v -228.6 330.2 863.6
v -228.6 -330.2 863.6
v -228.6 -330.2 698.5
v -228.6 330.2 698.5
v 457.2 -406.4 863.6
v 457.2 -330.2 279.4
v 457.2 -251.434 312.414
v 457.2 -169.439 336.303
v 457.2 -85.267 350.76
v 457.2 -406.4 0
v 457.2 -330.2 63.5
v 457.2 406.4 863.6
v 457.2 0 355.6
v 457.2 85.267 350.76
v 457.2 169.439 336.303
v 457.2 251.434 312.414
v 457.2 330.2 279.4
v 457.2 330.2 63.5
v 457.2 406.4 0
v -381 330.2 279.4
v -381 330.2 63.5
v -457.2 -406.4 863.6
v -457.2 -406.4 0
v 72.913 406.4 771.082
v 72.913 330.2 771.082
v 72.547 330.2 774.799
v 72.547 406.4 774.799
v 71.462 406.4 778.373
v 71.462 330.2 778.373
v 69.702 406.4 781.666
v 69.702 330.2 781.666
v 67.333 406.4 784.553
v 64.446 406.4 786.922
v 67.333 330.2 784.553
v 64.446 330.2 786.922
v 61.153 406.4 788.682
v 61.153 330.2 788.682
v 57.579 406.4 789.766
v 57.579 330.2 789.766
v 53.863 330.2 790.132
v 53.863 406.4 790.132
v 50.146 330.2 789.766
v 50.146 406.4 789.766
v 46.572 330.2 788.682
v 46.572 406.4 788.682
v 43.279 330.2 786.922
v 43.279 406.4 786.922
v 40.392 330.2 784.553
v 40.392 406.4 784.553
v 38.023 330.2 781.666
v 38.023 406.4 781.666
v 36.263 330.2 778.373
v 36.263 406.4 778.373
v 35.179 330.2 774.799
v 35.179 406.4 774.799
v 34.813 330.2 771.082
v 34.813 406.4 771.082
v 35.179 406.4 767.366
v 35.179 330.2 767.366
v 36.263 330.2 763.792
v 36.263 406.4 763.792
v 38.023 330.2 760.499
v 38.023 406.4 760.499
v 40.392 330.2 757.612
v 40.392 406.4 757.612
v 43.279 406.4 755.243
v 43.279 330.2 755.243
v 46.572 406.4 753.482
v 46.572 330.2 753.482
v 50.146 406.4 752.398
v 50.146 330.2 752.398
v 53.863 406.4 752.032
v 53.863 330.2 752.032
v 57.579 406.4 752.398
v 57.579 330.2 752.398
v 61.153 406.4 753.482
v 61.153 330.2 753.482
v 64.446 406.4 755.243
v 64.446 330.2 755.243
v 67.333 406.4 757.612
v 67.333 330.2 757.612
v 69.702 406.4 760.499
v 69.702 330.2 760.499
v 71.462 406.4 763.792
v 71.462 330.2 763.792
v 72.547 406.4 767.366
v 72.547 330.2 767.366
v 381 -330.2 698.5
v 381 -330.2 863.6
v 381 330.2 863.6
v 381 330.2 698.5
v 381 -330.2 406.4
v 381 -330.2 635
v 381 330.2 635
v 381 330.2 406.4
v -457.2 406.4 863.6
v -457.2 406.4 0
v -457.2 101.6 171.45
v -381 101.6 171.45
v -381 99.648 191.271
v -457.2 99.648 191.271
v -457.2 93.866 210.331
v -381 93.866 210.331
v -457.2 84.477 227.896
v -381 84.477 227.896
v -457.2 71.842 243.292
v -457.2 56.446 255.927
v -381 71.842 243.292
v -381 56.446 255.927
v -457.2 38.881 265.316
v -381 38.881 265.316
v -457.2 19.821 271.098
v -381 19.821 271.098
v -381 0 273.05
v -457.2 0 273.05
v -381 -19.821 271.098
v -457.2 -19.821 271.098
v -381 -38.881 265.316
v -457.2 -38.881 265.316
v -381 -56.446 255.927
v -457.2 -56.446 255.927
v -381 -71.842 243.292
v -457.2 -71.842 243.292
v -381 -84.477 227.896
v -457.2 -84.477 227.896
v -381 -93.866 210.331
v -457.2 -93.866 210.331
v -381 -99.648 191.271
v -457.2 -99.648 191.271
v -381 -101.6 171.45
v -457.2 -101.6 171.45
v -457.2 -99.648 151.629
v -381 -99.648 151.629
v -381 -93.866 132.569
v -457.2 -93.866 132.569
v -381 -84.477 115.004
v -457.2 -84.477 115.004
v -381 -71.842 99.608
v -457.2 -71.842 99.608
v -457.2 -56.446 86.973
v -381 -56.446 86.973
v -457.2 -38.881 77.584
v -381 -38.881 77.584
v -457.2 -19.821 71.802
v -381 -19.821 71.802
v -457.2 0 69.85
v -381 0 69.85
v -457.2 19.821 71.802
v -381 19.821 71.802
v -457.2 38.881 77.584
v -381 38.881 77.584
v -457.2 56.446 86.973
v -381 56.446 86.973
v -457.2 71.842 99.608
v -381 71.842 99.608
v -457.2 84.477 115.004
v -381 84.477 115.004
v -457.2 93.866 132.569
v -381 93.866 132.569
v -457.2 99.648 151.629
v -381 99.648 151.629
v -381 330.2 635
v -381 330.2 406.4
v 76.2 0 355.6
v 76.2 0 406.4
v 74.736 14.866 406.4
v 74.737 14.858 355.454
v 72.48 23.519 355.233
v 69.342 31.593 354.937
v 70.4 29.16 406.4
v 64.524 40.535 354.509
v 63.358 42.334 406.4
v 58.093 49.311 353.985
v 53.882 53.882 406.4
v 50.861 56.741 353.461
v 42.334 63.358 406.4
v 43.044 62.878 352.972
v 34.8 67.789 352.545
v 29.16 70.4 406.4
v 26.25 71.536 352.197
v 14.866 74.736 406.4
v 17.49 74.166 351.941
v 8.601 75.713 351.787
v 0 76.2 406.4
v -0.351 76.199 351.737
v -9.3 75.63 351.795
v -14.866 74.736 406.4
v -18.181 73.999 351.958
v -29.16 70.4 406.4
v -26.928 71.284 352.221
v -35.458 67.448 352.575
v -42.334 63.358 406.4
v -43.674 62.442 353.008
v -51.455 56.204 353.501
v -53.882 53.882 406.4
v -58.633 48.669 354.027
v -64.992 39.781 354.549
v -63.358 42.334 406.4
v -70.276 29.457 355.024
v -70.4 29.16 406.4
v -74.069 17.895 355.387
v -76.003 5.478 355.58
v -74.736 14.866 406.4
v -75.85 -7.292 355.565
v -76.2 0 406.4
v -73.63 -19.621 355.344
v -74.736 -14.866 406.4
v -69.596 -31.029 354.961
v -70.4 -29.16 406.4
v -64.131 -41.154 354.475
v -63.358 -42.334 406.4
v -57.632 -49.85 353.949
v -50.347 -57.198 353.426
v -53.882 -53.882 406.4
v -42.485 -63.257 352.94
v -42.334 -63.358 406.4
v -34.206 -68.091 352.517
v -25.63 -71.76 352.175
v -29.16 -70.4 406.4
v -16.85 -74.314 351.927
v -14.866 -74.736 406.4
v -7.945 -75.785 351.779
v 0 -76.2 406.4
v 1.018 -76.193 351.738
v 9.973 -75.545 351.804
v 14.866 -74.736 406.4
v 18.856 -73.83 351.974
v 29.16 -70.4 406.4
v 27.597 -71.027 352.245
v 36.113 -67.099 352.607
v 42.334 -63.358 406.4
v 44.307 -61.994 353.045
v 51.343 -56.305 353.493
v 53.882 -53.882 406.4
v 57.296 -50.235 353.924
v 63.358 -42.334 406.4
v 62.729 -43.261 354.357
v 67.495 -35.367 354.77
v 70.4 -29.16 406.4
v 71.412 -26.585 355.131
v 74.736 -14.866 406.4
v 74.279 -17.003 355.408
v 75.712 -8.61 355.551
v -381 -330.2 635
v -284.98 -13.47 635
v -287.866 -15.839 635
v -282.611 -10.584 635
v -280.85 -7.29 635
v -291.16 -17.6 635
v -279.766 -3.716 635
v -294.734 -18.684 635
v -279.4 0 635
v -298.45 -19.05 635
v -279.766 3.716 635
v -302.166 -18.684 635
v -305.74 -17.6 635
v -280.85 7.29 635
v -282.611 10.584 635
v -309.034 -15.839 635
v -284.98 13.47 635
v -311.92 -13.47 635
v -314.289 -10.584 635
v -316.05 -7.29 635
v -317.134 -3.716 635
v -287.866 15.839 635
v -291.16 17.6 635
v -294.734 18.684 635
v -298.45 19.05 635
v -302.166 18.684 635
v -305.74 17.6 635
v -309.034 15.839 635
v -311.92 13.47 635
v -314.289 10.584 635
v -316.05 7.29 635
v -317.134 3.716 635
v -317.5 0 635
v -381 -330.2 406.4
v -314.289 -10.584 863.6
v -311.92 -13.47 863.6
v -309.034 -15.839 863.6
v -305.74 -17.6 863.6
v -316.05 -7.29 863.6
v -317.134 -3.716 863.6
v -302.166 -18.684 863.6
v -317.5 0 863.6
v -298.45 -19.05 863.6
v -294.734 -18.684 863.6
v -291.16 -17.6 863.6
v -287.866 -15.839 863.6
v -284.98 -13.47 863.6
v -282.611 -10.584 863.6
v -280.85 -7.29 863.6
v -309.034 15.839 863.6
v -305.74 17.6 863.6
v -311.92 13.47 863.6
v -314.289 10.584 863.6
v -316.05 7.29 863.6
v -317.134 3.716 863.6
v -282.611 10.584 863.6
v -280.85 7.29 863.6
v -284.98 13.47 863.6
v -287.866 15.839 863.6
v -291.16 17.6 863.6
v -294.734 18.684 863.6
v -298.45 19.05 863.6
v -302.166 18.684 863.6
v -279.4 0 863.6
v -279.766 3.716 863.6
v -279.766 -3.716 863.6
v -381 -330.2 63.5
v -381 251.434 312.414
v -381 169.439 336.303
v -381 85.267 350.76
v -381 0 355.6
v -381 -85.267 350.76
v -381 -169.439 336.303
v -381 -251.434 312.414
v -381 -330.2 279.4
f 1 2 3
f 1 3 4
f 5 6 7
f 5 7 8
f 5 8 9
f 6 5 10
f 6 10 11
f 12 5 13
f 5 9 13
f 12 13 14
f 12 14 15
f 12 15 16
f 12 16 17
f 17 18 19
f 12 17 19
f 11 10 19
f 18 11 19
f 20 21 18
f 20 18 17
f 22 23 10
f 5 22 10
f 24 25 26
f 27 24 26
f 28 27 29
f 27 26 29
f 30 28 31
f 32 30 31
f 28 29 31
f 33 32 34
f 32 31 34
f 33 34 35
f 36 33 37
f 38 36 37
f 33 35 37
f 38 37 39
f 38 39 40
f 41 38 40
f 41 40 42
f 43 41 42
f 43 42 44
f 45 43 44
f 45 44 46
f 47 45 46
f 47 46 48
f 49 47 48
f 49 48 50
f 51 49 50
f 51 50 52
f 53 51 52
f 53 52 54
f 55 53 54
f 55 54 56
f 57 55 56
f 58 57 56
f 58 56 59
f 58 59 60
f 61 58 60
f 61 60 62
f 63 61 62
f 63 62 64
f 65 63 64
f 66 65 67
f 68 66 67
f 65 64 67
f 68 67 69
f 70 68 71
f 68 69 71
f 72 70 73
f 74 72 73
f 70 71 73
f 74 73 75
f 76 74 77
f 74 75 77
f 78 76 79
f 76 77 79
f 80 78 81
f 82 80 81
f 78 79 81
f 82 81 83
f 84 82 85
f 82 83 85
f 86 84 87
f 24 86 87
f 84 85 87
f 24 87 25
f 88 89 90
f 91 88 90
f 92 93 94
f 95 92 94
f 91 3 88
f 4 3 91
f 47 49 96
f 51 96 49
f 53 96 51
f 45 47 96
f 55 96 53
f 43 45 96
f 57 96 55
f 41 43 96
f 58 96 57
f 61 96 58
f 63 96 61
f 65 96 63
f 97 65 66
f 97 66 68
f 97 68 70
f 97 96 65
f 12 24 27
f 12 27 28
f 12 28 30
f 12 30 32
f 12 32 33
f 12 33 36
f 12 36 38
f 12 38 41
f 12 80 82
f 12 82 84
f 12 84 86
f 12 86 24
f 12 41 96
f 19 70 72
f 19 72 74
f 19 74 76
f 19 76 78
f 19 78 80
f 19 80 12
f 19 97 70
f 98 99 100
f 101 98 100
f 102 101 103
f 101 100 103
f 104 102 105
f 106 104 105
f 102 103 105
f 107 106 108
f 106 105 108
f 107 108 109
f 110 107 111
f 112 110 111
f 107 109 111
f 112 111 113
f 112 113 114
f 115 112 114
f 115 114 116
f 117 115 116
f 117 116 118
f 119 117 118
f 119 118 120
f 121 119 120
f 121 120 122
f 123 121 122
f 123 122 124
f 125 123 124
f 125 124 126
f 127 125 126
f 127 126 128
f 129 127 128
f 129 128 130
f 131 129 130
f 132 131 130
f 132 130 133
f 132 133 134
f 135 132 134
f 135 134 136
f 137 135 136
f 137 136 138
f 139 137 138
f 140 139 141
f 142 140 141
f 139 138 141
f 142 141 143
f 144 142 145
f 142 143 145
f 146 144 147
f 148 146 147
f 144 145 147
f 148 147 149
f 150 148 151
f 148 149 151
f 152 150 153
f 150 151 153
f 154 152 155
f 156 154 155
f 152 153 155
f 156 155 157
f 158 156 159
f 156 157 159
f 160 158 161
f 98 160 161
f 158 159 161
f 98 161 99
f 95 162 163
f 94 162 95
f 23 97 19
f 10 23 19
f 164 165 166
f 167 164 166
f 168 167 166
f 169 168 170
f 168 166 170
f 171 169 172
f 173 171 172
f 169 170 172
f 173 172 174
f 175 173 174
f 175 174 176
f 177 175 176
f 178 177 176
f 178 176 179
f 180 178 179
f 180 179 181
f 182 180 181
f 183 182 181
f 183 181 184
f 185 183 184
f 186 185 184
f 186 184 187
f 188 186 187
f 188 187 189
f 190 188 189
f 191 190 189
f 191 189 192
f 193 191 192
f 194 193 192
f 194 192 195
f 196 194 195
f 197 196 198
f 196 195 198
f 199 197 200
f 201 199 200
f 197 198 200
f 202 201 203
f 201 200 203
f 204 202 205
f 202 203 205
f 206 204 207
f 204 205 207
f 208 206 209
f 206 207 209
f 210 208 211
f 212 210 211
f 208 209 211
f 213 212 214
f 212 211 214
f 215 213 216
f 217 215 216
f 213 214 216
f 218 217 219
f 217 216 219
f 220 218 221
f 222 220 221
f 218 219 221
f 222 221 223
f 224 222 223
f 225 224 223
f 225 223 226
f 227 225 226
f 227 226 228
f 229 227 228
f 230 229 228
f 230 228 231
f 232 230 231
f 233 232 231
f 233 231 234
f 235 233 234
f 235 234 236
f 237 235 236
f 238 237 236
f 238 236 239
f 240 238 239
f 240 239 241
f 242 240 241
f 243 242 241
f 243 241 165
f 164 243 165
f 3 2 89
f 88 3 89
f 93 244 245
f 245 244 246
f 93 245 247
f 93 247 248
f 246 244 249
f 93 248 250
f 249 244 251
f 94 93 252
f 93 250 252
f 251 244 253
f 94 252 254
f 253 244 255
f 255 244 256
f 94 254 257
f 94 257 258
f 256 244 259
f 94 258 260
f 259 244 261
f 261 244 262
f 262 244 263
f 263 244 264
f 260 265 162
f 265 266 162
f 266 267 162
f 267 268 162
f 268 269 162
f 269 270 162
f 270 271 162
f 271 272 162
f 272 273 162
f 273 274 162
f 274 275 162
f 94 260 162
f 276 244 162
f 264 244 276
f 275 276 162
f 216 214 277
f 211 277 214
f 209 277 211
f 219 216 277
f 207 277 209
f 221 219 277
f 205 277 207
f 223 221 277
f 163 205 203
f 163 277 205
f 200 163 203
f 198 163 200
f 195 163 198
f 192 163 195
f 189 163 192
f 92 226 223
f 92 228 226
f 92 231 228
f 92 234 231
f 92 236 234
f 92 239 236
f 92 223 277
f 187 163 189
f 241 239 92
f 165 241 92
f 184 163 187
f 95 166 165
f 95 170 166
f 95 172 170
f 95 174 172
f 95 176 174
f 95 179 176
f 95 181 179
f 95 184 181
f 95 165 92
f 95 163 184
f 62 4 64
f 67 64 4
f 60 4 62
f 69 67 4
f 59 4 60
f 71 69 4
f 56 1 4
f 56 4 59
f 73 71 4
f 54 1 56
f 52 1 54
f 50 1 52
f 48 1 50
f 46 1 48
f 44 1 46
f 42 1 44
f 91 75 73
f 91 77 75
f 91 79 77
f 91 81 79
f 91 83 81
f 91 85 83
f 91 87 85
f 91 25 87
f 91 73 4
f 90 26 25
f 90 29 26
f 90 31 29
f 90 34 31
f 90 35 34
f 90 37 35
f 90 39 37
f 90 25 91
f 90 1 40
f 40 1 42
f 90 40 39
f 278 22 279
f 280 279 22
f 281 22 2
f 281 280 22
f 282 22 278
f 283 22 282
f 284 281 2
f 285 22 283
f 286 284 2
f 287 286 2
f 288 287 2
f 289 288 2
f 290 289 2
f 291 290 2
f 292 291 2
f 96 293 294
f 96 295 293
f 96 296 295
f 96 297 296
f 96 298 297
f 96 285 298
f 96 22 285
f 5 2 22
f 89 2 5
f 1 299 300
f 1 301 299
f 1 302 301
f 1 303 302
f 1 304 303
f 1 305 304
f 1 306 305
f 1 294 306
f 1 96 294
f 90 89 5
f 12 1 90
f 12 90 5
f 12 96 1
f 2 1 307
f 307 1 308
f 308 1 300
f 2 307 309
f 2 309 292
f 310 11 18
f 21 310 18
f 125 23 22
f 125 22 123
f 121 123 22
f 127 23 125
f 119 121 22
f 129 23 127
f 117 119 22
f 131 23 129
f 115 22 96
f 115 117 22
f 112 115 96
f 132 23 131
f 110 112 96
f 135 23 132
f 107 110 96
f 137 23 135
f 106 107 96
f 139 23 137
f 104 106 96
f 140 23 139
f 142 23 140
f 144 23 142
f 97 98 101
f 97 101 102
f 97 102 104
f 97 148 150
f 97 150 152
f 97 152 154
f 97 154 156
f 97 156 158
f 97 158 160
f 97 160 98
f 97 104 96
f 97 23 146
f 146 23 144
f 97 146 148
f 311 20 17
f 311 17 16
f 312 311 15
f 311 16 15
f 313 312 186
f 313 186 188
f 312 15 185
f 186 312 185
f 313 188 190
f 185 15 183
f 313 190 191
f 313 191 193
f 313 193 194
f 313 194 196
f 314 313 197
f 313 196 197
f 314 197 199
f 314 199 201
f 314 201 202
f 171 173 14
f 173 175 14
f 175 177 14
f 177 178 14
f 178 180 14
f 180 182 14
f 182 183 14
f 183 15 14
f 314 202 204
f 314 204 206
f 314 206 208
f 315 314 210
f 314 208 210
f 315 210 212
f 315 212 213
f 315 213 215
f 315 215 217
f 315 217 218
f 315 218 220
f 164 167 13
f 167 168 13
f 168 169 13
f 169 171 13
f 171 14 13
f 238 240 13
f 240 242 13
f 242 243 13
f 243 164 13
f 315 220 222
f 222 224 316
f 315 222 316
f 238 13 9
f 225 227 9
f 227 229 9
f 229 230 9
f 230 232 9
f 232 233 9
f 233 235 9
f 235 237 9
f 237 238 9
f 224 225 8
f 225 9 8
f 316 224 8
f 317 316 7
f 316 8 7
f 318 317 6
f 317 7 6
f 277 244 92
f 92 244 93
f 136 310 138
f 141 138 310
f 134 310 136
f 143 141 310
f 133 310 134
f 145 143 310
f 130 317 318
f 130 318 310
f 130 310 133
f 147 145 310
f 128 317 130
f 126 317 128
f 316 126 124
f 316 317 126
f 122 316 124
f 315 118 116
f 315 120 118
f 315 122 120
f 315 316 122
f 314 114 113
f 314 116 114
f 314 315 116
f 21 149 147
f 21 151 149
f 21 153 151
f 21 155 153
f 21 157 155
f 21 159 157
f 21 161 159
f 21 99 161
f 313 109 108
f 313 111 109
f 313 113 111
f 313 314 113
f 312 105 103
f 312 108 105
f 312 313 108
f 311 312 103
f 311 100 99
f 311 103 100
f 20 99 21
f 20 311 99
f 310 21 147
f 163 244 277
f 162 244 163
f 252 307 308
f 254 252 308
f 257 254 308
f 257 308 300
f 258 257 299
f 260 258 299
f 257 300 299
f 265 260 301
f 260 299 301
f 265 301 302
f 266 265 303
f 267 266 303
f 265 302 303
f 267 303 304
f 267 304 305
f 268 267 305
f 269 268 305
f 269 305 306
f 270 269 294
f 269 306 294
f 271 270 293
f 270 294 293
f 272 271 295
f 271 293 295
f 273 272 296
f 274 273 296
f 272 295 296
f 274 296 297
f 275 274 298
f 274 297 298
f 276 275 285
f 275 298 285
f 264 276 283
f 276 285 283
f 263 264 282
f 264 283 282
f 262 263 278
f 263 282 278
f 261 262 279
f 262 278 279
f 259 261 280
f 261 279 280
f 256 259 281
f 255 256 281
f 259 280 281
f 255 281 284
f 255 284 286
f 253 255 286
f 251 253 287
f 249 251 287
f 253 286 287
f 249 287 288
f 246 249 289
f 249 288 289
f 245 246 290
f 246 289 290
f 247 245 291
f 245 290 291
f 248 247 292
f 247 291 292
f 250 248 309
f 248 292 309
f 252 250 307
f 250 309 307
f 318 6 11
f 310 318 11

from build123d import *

# Parameters (mm, degrees)
F0_W      = 914.4
F0_H      = 812.8
F1_DEPTH  = 863.6
F3_DEPTH  = 838.2
F4_W      = 609.6
F4_H      = 660.4
F5_DEPTH  = 457.2
F6_W      = 660.4
F6_H      = 228.6
F7_DEPTH  = 152.4
F8_R      = 19.05
F9_DEPTH  = 228.6
F10_W     = 660.4
F10_H     = 63.5
F11_DEPTH = 609.6
F12_R     = 19.05
F13_DEPTH = 76.201
F14_R     = 76.2
F15_DEPTH = 54.6637094628
F16_R     = 101.6
F17_DEPTH = 76.201


with BuildPart() as f1:
    # F0 (on Top) → F1 (new body)
    with BuildSketch(Plane.XY):
        Rectangle(F0_W, F0_H)
    extrude(amount=F1_DEPTH)

    # F2 (on face) → F3 (cut)
    with BuildSketch(Plane.YZ.offset(457.2)):
        with BuildLine():
            Line((330.2, 63.5), (330.2, 279.4))
            ThreePointArc((330.2, 279.4), (0, 355.6), (-330.2, 279.4))
            Line((-330.2, 279.4), (-330.2, 63.5))
            Line((-330.2, 63.5), (330.2, 63.5))
        make_face()
    extrude(amount=-F3_DEPTH, mode=Mode.SUBTRACT)

    # F4 (on face) → F5 (cut)
    with BuildSketch(Plane.XY.offset(863.6)):
        with Locations((76.2, 0)):
            Rectangle(F4_W, F4_H)
    extrude(amount=-F5_DEPTH, mode=Mode.SUBTRACT)

    # F6 (on face) → F7 (cut)
    with BuildSketch(Plane.YZ.offset(-228.6)):
        with Locations((0, 520.7)):
            Rectangle(F6_W, F6_H)
    extrude(amount=-F7_DEPTH, mode=Mode.SUBTRACT)

    # F8 (on face) → F9 (cut, through all)
    with BuildSketch(Plane.XY.offset(863.6)):
        with Locations((-298.45, 0)):
            Circle(F8_R)
    extrude(amount=-F9_DEPTH, mode=Mode.SUBTRACT)

    # F10 (on face) → F11 (join, through all)
    with BuildSketch(Plane.YZ.offset(-228.6)):
        with Locations((0, 666.75)):
            Rectangle(F10_W, F10_H)
    extrude(amount=F11_DEPTH)

    # F12 (on face) → F13 (cut, through all)
    with BuildSketch(Plane.XZ.offset(-330.2)):
        with Locations((53.8625605404, 771.0824012756)):
            Circle(F12_R)
    extrude(amount=-F13_DEPTH, mode=Mode.SUBTRACT)

    # F14 (on face) → F15 (cut, through all)
    with BuildSketch(Plane.XY.offset(406.4)):
        Circle(F14_R)
    extrude(amount=-F15_DEPTH, mode=Mode.SUBTRACT)

    # F16 (on face) → F17 (cut, through all)
    with BuildSketch(Plane.YZ.offset(-381)):
        with Locations((0, 171.45)):
            Circle(F16_R)
    extrude(amount=-F17_DEPTH, mode=Mode.SUBTRACT)


solid = f1.part
